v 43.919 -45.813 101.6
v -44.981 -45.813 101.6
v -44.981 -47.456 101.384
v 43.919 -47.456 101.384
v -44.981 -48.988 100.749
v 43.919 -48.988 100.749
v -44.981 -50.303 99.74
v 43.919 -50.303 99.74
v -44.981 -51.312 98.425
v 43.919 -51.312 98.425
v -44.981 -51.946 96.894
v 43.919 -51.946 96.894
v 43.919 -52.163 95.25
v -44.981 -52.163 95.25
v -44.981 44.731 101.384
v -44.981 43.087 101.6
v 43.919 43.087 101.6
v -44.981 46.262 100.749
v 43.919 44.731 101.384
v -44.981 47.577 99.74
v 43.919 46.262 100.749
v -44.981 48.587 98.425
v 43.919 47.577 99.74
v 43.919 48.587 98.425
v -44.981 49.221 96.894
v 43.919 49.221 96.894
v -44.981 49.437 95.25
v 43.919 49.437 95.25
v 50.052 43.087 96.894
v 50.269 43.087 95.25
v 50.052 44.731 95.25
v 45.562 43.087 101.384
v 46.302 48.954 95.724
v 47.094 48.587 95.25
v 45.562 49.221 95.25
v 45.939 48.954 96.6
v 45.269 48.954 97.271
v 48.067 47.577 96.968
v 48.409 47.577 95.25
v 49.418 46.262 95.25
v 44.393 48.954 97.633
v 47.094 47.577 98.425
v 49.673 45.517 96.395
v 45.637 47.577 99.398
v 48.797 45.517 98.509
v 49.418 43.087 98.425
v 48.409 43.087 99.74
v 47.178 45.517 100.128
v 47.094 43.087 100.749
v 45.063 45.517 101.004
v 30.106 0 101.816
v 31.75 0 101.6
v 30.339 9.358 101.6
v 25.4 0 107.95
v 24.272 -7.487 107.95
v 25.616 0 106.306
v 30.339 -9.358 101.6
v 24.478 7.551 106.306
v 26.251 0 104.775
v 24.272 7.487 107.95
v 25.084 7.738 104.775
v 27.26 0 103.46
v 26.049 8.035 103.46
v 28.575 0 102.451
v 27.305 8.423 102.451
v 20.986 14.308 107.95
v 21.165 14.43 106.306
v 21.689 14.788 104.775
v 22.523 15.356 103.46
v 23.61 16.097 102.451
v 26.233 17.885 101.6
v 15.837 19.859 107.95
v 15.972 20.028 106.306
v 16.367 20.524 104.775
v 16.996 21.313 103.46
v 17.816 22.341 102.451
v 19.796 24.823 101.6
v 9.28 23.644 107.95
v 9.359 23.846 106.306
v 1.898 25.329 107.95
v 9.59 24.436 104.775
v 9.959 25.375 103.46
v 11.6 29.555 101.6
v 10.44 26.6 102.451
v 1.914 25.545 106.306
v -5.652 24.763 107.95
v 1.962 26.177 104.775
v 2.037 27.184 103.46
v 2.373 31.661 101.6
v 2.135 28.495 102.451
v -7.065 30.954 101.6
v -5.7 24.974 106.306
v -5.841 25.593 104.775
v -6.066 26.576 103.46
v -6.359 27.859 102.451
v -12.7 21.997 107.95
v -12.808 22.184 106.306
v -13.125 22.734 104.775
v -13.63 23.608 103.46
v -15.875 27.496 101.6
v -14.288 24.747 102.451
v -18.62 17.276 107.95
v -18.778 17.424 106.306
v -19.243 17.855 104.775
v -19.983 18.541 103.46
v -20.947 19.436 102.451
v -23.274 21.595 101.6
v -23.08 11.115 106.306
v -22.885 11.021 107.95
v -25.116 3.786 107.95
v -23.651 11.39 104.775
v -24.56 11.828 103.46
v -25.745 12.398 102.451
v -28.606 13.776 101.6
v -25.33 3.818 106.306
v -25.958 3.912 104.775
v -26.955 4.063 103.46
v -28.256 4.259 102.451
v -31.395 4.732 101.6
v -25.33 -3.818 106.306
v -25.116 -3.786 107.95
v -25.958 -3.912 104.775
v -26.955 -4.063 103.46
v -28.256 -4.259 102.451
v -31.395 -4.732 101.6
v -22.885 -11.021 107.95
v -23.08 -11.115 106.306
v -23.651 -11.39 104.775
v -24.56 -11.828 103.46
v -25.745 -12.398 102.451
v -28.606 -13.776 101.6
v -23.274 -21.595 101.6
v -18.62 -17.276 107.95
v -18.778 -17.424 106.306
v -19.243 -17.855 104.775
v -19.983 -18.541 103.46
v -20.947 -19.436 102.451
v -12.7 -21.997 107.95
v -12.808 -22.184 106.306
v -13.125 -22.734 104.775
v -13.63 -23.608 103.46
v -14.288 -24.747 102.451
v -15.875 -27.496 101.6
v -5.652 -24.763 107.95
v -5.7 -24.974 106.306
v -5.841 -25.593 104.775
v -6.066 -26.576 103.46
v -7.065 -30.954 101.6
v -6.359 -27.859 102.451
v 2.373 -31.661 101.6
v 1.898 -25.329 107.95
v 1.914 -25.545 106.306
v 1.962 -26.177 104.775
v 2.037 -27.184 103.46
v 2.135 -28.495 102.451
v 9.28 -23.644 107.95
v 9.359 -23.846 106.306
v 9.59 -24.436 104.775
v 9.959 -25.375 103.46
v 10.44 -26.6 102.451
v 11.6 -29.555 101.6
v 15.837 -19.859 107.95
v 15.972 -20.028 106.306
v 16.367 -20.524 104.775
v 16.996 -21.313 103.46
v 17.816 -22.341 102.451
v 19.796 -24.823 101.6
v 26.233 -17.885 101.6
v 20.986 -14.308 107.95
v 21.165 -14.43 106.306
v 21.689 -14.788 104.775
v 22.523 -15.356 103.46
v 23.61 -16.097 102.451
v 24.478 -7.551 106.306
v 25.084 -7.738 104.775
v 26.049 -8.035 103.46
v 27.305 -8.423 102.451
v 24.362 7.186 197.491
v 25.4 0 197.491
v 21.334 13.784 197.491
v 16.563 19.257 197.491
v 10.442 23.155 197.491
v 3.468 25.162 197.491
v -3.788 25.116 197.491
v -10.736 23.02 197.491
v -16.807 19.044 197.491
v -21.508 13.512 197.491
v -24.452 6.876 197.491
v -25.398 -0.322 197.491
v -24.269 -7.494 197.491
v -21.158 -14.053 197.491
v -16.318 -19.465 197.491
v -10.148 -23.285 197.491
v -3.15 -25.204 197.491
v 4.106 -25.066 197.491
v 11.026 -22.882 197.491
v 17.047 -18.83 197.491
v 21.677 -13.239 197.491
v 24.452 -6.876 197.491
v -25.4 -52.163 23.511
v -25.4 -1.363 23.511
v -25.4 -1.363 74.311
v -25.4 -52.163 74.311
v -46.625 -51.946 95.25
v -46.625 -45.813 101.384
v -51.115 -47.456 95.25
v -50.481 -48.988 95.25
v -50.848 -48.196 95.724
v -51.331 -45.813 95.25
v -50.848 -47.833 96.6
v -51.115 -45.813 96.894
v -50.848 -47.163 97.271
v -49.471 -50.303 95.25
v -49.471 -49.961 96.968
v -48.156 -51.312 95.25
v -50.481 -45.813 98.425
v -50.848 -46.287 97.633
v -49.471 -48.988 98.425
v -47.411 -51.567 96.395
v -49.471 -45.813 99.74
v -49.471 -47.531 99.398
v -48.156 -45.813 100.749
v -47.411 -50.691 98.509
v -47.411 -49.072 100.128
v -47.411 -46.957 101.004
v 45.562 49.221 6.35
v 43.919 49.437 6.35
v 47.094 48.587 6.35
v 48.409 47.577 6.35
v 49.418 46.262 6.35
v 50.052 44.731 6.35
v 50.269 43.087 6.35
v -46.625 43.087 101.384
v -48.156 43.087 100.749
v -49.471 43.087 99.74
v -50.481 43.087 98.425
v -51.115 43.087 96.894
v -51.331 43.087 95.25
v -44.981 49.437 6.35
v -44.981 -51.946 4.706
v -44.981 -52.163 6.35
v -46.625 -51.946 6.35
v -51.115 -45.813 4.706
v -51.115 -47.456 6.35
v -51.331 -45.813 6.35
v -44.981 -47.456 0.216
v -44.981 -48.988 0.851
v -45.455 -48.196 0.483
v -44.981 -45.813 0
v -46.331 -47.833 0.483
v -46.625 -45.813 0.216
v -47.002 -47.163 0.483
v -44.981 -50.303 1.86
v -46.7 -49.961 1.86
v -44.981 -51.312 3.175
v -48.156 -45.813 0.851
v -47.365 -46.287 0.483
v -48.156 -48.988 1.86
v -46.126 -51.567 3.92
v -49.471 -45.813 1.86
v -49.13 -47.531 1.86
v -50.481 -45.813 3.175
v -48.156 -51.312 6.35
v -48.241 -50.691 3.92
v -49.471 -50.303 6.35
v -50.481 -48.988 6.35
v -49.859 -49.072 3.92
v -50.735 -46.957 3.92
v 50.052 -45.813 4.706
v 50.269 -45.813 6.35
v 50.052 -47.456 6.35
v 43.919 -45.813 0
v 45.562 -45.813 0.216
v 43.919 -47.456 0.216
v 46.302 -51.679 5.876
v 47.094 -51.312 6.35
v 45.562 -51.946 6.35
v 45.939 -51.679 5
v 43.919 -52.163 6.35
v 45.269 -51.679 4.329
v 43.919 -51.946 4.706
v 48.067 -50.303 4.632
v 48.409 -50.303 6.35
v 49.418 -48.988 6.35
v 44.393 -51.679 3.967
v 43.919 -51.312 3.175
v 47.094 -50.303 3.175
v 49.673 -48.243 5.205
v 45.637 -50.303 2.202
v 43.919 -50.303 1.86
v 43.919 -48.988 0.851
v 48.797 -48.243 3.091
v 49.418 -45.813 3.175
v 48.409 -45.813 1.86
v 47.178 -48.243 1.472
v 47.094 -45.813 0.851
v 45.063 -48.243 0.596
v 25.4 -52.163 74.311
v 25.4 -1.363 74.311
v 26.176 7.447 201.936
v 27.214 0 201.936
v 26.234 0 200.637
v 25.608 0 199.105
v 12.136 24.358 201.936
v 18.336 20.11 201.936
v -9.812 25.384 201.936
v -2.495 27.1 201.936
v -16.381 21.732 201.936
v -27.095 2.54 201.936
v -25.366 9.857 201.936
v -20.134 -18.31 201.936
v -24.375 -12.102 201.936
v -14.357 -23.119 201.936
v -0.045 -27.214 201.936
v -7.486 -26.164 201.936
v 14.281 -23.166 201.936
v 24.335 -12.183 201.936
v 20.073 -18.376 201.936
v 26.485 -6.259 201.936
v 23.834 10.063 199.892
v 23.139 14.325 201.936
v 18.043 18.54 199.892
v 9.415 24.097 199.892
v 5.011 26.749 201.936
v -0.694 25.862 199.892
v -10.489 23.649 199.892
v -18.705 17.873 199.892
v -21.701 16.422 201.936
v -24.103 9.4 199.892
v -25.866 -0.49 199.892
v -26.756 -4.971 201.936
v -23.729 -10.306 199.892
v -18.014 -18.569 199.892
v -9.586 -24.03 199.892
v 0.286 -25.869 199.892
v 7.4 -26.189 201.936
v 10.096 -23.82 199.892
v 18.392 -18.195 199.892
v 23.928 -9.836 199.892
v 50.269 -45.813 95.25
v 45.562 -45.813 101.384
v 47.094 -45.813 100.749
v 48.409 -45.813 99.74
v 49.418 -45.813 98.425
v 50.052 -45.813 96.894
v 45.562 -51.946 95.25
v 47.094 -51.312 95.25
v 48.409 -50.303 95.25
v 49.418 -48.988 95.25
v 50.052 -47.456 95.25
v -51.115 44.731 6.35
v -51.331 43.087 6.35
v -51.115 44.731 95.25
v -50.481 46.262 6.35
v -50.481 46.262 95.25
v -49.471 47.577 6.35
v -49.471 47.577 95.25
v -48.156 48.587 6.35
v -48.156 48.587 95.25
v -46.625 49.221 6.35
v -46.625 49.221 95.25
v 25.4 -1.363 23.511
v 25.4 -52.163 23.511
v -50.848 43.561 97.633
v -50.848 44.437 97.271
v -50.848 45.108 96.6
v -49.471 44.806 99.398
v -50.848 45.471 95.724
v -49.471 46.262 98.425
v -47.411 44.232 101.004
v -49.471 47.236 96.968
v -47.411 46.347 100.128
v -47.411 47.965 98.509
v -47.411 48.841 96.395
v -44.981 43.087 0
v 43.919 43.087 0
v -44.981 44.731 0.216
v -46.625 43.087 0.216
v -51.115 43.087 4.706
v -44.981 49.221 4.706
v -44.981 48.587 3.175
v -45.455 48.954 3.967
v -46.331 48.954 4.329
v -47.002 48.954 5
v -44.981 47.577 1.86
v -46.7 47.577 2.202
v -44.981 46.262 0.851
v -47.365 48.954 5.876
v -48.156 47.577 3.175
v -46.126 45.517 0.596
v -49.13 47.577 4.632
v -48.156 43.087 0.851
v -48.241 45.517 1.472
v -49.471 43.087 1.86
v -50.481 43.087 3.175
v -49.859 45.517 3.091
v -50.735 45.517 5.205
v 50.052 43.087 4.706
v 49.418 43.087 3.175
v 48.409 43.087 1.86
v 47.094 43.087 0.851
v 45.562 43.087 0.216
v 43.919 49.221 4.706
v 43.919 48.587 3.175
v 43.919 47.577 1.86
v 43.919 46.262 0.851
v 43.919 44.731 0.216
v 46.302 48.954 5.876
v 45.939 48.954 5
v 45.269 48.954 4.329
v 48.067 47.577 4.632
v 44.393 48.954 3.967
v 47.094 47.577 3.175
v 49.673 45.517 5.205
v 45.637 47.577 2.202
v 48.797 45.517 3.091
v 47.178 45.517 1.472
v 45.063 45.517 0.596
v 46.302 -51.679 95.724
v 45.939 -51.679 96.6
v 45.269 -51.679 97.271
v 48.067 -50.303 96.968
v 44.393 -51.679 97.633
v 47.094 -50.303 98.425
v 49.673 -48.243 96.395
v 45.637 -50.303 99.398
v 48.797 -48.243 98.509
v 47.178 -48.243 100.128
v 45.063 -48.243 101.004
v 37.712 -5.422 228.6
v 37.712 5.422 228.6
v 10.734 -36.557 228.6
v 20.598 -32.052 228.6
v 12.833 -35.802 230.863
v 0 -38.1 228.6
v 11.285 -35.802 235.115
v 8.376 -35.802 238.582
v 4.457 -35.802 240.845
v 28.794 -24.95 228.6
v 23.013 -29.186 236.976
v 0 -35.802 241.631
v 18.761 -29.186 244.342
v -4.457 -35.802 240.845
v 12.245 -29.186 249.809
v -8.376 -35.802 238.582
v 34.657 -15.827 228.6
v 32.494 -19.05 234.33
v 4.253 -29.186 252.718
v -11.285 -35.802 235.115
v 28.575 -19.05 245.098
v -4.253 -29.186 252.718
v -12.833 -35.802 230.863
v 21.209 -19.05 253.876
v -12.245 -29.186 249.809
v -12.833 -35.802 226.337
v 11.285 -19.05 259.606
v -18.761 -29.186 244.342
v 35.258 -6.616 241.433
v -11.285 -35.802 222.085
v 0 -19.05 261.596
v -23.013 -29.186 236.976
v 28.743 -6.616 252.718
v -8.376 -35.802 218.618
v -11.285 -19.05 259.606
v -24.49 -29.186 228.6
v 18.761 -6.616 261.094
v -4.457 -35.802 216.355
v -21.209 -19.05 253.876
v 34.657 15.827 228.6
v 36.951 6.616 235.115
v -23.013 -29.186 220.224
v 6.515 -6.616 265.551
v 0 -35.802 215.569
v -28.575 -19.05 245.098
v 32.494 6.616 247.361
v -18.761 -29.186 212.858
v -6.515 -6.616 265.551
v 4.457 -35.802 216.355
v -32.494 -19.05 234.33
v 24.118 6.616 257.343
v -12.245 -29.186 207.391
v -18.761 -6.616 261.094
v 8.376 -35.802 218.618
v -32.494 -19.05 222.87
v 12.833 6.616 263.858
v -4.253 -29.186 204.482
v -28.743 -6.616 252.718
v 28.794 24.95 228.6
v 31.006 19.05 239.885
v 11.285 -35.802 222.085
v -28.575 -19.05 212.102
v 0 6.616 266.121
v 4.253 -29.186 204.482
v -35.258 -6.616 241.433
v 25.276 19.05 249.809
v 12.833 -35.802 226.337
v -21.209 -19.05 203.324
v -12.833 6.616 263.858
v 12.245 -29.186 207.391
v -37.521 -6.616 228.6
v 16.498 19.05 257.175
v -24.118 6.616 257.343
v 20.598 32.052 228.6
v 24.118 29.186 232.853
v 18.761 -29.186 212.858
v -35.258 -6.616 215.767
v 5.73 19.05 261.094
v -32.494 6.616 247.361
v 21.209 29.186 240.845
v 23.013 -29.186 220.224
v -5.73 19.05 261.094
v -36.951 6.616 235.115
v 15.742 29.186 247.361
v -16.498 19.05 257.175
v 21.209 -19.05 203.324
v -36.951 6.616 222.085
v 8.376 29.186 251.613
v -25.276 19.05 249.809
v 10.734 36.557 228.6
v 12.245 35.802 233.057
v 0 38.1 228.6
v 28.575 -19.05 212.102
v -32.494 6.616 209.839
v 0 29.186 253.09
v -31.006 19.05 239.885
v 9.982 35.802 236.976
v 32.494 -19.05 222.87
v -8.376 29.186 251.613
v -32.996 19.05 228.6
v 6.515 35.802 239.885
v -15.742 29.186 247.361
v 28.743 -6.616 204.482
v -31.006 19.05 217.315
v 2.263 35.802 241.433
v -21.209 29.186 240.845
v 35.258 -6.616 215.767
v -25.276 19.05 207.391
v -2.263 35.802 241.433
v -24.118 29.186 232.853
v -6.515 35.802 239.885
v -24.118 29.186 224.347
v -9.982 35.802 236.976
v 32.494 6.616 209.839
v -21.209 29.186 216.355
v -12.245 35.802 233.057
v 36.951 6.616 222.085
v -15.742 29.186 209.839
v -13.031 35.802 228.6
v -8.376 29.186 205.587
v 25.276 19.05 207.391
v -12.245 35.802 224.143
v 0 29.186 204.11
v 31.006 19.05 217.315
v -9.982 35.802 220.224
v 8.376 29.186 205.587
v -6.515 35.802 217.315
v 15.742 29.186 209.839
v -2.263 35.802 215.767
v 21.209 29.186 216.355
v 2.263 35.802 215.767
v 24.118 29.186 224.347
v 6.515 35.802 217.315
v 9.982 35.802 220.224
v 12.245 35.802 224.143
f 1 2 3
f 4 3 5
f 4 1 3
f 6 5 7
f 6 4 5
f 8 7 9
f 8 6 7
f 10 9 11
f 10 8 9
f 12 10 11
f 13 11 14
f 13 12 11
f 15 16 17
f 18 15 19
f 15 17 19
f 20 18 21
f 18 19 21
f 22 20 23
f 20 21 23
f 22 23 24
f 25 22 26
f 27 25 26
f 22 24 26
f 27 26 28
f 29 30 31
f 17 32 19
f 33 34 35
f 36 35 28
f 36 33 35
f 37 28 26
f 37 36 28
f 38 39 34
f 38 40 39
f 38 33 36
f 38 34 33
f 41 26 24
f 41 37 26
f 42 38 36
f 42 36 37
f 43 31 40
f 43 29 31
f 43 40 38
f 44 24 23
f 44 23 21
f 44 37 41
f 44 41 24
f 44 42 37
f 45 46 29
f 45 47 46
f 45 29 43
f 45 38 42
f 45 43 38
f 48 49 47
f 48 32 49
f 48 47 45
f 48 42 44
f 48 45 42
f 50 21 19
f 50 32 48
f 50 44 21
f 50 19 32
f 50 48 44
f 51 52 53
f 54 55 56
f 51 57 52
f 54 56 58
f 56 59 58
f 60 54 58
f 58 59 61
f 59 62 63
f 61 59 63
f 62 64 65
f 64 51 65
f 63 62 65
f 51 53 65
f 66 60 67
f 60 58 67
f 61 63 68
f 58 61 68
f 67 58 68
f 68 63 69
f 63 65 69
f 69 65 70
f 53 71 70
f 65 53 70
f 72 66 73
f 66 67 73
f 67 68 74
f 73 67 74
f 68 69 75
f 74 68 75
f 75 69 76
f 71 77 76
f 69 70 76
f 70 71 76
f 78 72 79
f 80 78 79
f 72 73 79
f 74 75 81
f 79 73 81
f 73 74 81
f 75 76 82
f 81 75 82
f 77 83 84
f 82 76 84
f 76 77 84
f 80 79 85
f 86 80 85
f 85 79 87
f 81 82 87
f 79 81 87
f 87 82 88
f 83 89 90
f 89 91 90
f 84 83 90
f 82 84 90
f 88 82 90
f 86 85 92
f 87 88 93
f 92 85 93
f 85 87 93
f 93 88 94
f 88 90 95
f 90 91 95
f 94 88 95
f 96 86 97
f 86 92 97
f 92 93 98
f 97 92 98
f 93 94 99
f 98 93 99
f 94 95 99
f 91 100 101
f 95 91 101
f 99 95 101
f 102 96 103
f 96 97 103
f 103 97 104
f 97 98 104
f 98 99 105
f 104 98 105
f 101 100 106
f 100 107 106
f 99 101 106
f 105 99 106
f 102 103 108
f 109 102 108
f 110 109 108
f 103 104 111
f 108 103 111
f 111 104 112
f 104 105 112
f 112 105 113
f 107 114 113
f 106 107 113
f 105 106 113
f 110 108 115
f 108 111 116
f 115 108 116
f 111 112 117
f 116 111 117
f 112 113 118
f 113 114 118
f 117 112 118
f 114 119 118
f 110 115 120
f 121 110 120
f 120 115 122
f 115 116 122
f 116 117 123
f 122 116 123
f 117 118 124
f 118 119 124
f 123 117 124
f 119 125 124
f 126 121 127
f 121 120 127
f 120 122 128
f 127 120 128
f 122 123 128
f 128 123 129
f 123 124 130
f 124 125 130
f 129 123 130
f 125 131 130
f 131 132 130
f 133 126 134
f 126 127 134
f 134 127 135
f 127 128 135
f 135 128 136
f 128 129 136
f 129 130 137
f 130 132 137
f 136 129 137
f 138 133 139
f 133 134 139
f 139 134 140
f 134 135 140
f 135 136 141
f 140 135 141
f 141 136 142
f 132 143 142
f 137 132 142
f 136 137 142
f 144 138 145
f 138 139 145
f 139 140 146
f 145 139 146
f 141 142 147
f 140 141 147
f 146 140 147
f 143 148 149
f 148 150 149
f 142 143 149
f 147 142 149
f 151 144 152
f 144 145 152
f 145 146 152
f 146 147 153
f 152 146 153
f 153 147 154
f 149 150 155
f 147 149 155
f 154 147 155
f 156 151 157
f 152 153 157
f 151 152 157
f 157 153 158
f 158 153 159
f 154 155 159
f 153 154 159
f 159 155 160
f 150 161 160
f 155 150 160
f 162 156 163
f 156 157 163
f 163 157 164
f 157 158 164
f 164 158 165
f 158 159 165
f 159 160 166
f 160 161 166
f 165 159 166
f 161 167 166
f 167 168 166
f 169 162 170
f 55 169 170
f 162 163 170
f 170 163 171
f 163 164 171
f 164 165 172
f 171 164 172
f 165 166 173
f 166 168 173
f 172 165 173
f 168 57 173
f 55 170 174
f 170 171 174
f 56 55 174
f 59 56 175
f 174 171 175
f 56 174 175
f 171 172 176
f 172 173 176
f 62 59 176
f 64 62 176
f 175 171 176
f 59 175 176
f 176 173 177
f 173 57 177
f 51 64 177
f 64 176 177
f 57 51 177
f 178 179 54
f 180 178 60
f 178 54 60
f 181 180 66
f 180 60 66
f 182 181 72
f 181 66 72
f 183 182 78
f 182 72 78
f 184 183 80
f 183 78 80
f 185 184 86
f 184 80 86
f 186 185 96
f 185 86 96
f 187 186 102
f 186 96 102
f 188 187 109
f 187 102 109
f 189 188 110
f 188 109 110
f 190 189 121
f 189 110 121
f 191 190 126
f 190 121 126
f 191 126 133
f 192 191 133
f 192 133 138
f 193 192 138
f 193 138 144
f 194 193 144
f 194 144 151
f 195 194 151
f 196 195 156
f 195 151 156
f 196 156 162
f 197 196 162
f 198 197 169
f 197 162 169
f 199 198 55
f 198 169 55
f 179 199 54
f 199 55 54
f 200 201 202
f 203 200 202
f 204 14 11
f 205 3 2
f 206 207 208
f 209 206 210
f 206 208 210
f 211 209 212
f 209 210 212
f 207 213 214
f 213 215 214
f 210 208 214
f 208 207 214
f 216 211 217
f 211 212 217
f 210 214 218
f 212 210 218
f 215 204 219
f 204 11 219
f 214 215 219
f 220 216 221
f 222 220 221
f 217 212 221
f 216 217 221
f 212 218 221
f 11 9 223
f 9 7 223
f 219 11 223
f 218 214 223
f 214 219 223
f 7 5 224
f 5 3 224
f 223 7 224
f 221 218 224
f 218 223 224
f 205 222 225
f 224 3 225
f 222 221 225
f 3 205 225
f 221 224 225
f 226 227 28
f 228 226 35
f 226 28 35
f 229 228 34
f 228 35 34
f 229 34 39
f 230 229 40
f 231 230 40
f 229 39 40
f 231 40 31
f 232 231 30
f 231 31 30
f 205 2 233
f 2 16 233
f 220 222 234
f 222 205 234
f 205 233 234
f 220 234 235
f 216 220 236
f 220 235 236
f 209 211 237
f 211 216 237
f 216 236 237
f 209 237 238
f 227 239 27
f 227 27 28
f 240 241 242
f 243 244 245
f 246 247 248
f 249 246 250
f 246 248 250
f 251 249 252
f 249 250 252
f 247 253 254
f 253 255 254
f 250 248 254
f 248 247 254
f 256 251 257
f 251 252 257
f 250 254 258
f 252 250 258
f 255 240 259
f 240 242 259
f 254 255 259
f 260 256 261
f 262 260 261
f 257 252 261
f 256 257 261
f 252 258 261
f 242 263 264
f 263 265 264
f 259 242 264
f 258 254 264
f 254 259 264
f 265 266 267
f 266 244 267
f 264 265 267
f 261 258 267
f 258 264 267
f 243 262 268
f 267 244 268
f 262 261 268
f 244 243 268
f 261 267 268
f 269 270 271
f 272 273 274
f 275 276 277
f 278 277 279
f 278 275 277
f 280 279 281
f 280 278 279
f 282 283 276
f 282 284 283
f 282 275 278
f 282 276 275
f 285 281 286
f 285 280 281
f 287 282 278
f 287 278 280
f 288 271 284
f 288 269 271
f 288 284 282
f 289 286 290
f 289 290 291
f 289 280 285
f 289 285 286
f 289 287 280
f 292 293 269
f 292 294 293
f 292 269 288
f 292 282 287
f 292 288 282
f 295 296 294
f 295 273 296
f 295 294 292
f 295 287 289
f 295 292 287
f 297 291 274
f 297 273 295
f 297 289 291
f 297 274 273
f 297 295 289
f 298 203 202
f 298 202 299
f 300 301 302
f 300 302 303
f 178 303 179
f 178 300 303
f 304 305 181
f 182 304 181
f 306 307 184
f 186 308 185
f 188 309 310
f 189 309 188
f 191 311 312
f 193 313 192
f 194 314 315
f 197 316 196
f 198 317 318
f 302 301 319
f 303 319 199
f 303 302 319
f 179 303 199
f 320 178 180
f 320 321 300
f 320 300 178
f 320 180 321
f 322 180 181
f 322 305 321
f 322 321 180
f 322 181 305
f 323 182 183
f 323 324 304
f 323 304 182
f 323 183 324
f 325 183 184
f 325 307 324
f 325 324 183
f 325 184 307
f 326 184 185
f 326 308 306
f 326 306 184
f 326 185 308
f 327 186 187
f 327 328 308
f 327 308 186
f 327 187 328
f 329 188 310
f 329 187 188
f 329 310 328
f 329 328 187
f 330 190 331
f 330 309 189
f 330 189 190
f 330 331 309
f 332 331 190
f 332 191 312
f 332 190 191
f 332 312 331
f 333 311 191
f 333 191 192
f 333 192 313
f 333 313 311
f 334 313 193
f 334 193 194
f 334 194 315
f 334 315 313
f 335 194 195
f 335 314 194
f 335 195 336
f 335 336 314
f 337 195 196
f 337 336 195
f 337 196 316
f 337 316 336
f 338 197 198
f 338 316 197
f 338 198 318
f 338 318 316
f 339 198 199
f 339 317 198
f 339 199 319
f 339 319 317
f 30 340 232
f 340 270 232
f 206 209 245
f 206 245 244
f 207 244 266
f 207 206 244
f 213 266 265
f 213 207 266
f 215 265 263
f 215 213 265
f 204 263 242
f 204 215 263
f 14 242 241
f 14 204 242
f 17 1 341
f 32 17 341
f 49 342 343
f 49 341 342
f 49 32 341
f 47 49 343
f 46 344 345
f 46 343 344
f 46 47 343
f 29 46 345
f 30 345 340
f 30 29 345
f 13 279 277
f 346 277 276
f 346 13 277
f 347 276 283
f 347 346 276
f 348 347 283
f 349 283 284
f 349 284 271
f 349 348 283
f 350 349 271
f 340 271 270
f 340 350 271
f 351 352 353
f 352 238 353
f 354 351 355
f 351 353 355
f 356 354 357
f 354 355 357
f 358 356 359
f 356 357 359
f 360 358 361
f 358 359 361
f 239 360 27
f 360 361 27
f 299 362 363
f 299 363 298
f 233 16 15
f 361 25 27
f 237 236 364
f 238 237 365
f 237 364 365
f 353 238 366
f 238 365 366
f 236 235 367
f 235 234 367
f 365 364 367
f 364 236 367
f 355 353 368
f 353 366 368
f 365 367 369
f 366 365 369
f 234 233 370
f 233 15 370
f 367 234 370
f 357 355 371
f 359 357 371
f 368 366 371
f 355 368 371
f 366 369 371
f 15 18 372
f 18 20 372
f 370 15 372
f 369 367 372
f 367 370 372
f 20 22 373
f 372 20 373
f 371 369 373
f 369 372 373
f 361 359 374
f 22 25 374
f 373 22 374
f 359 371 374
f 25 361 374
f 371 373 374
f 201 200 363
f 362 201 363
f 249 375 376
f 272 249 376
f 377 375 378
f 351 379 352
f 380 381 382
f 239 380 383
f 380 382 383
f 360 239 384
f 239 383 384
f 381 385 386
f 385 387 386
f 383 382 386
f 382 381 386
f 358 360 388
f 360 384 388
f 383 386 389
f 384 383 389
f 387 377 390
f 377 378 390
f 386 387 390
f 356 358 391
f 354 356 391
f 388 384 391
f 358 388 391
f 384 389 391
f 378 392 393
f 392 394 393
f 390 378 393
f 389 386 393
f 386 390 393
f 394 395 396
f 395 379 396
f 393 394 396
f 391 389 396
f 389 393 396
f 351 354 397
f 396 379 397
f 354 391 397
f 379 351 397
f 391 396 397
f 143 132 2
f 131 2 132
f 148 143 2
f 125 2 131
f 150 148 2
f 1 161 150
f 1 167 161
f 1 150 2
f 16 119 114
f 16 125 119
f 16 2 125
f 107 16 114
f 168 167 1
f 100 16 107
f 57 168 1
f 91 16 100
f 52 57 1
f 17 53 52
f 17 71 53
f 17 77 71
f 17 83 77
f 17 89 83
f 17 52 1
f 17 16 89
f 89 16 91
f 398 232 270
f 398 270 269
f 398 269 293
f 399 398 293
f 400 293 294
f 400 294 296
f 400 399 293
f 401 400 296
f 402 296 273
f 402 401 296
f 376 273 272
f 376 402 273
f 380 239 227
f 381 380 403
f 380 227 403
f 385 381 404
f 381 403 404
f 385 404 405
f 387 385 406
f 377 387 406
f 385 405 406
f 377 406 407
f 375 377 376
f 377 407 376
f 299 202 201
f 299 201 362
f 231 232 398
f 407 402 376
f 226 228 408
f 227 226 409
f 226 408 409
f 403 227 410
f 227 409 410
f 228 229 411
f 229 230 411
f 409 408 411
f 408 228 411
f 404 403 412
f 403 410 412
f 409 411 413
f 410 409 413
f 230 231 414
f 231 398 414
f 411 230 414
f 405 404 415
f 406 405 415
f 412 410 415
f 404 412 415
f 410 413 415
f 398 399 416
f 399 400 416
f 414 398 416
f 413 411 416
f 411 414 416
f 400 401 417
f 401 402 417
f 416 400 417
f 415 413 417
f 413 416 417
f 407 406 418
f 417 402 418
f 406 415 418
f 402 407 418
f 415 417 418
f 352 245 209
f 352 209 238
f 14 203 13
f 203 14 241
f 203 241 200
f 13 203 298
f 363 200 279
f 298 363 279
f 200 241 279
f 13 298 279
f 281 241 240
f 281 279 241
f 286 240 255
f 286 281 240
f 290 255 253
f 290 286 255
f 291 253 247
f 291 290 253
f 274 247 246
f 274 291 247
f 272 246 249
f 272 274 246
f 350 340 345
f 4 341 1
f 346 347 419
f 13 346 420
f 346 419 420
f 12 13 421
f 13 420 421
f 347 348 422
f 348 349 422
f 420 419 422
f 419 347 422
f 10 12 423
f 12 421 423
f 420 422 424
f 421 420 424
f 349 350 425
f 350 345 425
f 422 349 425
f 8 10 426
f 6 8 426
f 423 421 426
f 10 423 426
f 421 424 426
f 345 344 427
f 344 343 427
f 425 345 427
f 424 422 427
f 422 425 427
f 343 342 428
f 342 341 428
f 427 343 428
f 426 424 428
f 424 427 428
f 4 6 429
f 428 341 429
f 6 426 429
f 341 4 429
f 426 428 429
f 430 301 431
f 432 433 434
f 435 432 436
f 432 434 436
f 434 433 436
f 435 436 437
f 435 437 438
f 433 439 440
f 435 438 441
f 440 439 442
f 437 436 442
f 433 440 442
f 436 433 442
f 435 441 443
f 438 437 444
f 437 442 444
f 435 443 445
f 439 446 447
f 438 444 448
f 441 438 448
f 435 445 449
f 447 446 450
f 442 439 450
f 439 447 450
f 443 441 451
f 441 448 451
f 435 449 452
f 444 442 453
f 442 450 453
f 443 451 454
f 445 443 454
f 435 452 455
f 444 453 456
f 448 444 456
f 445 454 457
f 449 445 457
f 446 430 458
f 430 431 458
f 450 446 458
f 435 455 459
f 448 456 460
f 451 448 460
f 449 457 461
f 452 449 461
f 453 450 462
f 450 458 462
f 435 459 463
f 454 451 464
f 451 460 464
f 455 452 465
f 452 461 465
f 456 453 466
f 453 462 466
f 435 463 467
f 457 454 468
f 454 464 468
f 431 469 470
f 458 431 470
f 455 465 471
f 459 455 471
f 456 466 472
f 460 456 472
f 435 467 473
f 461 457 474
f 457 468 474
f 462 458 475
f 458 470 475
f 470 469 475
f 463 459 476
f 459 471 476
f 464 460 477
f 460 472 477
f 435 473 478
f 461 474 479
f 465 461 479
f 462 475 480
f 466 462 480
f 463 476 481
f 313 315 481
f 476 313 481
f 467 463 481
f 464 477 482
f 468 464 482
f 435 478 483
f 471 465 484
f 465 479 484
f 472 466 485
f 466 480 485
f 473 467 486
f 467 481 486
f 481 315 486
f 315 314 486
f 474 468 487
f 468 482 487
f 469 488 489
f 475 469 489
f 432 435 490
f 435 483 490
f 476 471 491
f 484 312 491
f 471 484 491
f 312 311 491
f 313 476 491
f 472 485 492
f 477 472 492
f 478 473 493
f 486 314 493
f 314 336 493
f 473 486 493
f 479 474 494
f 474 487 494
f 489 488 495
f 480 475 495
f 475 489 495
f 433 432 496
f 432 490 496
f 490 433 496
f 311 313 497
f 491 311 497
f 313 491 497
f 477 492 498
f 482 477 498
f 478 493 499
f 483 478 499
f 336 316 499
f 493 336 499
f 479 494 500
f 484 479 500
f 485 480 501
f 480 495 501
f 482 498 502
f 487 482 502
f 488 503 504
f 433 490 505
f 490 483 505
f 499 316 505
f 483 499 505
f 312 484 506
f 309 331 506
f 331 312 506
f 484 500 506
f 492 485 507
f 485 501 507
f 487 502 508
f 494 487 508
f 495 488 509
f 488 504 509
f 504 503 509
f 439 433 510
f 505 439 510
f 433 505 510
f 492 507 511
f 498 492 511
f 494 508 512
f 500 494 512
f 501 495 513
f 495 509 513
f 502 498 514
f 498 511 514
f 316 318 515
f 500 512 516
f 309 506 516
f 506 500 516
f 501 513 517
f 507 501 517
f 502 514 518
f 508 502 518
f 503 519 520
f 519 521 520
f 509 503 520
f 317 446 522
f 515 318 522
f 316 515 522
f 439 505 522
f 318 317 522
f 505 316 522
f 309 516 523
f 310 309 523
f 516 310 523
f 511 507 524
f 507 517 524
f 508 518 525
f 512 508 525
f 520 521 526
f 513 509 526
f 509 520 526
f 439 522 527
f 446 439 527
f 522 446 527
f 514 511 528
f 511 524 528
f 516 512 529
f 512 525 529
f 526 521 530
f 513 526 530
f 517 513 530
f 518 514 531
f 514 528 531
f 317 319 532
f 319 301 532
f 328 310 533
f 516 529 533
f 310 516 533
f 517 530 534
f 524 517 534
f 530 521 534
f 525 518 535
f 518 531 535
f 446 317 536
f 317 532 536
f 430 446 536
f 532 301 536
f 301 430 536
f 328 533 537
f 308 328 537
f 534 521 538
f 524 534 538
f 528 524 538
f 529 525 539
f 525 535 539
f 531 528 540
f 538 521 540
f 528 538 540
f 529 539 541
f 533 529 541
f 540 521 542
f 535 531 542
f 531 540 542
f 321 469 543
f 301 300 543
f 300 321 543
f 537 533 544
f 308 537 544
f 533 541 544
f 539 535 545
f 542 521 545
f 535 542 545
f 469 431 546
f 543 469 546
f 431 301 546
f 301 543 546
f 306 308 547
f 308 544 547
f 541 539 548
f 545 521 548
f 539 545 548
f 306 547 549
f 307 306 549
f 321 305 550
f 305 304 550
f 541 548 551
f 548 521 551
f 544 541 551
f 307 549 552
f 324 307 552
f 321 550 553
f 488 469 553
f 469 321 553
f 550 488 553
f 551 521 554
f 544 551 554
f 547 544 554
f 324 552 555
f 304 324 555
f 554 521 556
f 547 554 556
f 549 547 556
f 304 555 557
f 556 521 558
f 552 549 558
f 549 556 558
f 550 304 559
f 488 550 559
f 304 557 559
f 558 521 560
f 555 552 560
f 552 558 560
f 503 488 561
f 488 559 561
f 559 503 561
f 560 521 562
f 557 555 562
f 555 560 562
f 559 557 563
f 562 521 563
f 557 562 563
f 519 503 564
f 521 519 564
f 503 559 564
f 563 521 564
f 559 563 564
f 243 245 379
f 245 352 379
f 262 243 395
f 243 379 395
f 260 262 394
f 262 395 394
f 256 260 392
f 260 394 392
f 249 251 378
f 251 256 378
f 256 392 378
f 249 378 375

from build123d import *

# Parameters (mm, degrees)
F0_W     = 101.6
F0_H     = 101.6
F1_DEPTH = 101.6
F2_R     = 25.4
F3_DEPTH = 25.4
F4_DEPTH = 101.6
F7_W     = 50.8
F7_H     = 50.8
F8_DEPTH = 50.8
F9_R     = 6.35


with BuildPart() as f1:
    # F0 (on Top) → F1 (new body)
    with BuildSketch(Plane.XY):
        with Locations((-0.531297791, -1.3627031267)):
            Rectangle(F0_W, F0_H)
    extrude(amount=F1_DEPTH)

    # F2 (on face) → F3 (join)
    with BuildSketch(Plane.XY.offset(101.6)):
        Circle(F2_R)
    extrude(amount=F3_DEPTH)

    # F4 (add): a face of the model
    f4_faces = [f1.faces().sort_by_distance(p)[0] for p in [
        (0, 0, 127),
    ]]
    extrude(f4_faces, amount=F4_DEPTH)

    # F5 (on face) → F6 (revolve)
    with BuildSketch(Plane.XY.offset(228.6)):
        with BuildLine():
            Line((0, -25.4), (0, -38.1))
            ThreePointArc((0, -38.1), (38.1, 0), (0, 38.1))
            Line((0, 38.1), (0, 25.4))
            ThreePointArc((0, 25.4), (17.9605122421, 17.9605122421), (25.4, 0))
            ThreePointArc((25.4, 0), (17.9605122421, -17.9605122421), (0, -25.4))
        make_face()
        with BuildLine():
            Line((0, 25.4), (0, -25.4))
            ThreePointArc((0, -25.4), (17.9605122421, -17.9605122421), (25.4, 0))
            ThreePointArc((25.4, 0), (17.9605122421, 17.9605122421), (0, 25.4))
        make_face()
    revolve(axis=Axis((0, 0, 228.6), (0, -1, 0)))

    # F7 (on face) → F8 (cut)
    with BuildSketch(Plane.XZ.offset(52.1627031267)):
        with Locations((0, 48.9108748734)):
            Rectangle(F7_W, F7_H)
    extrude(amount=-F8_DEPTH, mode=Mode.SUBTRACT)

    # F9
    f9_edges = [f1.edges().sort_by_distance(p)[0] for p in [
        (50.268702, -1.362703, 101.6),
        (50.268702, -1.362703, 0),
        (50.268702, -52.162703, 50.8),
        (50.268702, 49.437297, 50.8),
        (-0.531298, -52.162703, 101.6),
        (-51.331298, -52.162703, 50.8),
        (-0.531298, -52.162703, 0),
        (-51.331298, -1.362703, 0),
        (-0.531298, 49.437297, 0),
        (-0.531298, 49.437297, 101.6),
        (-51.331298, -1.362703, 101.6),
        (-51.331298, 49.437297, 50.8),
        (-25.4, 0, 200.201937),
        (-25.4, 0, 101.6),
    ]]
    fillet(f9_edges, radius=F9_R)


solid = f1.part
